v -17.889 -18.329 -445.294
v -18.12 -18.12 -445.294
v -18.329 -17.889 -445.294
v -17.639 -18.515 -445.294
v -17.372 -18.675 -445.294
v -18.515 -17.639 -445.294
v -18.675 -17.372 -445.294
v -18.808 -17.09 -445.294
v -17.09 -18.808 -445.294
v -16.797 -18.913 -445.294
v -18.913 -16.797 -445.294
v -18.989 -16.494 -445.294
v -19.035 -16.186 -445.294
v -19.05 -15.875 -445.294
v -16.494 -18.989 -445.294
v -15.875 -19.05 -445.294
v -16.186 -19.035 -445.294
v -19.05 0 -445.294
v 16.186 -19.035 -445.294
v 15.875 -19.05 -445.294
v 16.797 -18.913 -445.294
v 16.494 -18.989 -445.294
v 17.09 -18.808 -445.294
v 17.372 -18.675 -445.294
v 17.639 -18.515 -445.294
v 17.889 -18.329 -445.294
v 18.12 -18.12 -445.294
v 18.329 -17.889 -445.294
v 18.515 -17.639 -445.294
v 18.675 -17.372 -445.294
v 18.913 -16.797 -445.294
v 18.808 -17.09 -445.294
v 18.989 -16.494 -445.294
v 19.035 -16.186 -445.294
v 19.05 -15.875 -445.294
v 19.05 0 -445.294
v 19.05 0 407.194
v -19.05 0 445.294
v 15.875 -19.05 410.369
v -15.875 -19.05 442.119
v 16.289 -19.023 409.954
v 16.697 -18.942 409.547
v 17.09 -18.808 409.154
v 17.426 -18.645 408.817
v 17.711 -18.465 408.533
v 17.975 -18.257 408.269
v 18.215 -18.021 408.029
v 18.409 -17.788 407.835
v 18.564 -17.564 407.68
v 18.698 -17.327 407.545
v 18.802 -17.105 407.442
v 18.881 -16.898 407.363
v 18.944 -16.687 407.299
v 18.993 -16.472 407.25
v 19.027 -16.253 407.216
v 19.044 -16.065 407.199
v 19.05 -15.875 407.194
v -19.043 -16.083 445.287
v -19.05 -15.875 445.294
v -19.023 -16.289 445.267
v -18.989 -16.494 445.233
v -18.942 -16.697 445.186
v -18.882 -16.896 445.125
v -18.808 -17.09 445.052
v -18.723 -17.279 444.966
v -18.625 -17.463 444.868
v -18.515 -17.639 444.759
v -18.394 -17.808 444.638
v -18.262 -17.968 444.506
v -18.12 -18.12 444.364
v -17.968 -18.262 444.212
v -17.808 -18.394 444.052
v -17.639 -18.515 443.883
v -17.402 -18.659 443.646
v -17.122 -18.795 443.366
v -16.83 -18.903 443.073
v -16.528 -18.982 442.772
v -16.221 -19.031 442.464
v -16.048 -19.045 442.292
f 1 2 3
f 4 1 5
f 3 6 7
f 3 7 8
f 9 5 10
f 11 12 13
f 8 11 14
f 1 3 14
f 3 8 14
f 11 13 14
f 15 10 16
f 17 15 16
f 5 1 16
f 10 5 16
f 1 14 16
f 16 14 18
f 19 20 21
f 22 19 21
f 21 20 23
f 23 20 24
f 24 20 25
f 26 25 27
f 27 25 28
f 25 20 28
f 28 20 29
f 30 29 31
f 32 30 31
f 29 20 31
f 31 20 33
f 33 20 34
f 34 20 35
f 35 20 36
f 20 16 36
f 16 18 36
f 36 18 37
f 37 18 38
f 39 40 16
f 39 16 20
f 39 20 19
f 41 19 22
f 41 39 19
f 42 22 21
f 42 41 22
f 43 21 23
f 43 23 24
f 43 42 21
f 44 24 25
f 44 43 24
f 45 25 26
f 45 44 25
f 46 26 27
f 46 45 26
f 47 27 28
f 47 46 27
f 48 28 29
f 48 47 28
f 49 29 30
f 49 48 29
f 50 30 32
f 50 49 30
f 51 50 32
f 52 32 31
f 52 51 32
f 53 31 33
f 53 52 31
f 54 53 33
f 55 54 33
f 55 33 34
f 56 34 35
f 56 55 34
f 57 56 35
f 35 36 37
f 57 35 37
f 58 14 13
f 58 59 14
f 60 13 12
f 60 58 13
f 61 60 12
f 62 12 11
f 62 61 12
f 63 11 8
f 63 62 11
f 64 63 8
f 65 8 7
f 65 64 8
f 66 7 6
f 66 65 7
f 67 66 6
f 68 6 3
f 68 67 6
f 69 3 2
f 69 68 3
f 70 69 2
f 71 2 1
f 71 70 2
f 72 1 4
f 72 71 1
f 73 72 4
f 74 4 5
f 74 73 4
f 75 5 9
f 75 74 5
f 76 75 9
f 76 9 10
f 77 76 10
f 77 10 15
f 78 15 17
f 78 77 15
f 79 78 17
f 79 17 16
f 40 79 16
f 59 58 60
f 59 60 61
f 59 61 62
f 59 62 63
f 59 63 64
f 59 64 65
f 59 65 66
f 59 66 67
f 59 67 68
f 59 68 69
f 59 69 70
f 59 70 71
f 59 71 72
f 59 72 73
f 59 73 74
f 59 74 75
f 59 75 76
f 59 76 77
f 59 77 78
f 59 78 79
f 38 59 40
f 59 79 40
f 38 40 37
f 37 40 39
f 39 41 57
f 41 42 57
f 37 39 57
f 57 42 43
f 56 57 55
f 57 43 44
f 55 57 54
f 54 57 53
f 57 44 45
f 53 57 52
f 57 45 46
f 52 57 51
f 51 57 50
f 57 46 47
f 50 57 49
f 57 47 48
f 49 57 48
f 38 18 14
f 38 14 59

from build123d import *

# Parameters (mm, degrees)
F0_W     = 38.1
F0_H     = 890.5875
F1_DEPTH = 19.05
F3_DEPTH = 19.051
F4_R     = 3.175


with BuildPart() as f1:
    # F0 (on Front) → F1 (new body)
    with BuildSketch(Plane.XZ):
        Rectangle(F0_W, F0_H)
    extrude(amount=F1_DEPTH)

    # F2 (on face) → F3 (cut, through all)
    with BuildSketch(Plane.XZ.offset(19.05)):
        Polygon((19.05, 445.29375), (-19.05, 445.29375), (19.05, 407.19375), align=None)
    extrude(amount=-F3_DEPTH, mode=Mode.SUBTRACT)

    # F4
    f4_edges = [f1.edges().sort_by_distance(p)[0] for p in [
        (-19.05, -19.05, 0),
        (19.05, -19.05, -19.05),
    ]]
    fillet(f4_edges, radius=F4_R)


solid = f1.part
